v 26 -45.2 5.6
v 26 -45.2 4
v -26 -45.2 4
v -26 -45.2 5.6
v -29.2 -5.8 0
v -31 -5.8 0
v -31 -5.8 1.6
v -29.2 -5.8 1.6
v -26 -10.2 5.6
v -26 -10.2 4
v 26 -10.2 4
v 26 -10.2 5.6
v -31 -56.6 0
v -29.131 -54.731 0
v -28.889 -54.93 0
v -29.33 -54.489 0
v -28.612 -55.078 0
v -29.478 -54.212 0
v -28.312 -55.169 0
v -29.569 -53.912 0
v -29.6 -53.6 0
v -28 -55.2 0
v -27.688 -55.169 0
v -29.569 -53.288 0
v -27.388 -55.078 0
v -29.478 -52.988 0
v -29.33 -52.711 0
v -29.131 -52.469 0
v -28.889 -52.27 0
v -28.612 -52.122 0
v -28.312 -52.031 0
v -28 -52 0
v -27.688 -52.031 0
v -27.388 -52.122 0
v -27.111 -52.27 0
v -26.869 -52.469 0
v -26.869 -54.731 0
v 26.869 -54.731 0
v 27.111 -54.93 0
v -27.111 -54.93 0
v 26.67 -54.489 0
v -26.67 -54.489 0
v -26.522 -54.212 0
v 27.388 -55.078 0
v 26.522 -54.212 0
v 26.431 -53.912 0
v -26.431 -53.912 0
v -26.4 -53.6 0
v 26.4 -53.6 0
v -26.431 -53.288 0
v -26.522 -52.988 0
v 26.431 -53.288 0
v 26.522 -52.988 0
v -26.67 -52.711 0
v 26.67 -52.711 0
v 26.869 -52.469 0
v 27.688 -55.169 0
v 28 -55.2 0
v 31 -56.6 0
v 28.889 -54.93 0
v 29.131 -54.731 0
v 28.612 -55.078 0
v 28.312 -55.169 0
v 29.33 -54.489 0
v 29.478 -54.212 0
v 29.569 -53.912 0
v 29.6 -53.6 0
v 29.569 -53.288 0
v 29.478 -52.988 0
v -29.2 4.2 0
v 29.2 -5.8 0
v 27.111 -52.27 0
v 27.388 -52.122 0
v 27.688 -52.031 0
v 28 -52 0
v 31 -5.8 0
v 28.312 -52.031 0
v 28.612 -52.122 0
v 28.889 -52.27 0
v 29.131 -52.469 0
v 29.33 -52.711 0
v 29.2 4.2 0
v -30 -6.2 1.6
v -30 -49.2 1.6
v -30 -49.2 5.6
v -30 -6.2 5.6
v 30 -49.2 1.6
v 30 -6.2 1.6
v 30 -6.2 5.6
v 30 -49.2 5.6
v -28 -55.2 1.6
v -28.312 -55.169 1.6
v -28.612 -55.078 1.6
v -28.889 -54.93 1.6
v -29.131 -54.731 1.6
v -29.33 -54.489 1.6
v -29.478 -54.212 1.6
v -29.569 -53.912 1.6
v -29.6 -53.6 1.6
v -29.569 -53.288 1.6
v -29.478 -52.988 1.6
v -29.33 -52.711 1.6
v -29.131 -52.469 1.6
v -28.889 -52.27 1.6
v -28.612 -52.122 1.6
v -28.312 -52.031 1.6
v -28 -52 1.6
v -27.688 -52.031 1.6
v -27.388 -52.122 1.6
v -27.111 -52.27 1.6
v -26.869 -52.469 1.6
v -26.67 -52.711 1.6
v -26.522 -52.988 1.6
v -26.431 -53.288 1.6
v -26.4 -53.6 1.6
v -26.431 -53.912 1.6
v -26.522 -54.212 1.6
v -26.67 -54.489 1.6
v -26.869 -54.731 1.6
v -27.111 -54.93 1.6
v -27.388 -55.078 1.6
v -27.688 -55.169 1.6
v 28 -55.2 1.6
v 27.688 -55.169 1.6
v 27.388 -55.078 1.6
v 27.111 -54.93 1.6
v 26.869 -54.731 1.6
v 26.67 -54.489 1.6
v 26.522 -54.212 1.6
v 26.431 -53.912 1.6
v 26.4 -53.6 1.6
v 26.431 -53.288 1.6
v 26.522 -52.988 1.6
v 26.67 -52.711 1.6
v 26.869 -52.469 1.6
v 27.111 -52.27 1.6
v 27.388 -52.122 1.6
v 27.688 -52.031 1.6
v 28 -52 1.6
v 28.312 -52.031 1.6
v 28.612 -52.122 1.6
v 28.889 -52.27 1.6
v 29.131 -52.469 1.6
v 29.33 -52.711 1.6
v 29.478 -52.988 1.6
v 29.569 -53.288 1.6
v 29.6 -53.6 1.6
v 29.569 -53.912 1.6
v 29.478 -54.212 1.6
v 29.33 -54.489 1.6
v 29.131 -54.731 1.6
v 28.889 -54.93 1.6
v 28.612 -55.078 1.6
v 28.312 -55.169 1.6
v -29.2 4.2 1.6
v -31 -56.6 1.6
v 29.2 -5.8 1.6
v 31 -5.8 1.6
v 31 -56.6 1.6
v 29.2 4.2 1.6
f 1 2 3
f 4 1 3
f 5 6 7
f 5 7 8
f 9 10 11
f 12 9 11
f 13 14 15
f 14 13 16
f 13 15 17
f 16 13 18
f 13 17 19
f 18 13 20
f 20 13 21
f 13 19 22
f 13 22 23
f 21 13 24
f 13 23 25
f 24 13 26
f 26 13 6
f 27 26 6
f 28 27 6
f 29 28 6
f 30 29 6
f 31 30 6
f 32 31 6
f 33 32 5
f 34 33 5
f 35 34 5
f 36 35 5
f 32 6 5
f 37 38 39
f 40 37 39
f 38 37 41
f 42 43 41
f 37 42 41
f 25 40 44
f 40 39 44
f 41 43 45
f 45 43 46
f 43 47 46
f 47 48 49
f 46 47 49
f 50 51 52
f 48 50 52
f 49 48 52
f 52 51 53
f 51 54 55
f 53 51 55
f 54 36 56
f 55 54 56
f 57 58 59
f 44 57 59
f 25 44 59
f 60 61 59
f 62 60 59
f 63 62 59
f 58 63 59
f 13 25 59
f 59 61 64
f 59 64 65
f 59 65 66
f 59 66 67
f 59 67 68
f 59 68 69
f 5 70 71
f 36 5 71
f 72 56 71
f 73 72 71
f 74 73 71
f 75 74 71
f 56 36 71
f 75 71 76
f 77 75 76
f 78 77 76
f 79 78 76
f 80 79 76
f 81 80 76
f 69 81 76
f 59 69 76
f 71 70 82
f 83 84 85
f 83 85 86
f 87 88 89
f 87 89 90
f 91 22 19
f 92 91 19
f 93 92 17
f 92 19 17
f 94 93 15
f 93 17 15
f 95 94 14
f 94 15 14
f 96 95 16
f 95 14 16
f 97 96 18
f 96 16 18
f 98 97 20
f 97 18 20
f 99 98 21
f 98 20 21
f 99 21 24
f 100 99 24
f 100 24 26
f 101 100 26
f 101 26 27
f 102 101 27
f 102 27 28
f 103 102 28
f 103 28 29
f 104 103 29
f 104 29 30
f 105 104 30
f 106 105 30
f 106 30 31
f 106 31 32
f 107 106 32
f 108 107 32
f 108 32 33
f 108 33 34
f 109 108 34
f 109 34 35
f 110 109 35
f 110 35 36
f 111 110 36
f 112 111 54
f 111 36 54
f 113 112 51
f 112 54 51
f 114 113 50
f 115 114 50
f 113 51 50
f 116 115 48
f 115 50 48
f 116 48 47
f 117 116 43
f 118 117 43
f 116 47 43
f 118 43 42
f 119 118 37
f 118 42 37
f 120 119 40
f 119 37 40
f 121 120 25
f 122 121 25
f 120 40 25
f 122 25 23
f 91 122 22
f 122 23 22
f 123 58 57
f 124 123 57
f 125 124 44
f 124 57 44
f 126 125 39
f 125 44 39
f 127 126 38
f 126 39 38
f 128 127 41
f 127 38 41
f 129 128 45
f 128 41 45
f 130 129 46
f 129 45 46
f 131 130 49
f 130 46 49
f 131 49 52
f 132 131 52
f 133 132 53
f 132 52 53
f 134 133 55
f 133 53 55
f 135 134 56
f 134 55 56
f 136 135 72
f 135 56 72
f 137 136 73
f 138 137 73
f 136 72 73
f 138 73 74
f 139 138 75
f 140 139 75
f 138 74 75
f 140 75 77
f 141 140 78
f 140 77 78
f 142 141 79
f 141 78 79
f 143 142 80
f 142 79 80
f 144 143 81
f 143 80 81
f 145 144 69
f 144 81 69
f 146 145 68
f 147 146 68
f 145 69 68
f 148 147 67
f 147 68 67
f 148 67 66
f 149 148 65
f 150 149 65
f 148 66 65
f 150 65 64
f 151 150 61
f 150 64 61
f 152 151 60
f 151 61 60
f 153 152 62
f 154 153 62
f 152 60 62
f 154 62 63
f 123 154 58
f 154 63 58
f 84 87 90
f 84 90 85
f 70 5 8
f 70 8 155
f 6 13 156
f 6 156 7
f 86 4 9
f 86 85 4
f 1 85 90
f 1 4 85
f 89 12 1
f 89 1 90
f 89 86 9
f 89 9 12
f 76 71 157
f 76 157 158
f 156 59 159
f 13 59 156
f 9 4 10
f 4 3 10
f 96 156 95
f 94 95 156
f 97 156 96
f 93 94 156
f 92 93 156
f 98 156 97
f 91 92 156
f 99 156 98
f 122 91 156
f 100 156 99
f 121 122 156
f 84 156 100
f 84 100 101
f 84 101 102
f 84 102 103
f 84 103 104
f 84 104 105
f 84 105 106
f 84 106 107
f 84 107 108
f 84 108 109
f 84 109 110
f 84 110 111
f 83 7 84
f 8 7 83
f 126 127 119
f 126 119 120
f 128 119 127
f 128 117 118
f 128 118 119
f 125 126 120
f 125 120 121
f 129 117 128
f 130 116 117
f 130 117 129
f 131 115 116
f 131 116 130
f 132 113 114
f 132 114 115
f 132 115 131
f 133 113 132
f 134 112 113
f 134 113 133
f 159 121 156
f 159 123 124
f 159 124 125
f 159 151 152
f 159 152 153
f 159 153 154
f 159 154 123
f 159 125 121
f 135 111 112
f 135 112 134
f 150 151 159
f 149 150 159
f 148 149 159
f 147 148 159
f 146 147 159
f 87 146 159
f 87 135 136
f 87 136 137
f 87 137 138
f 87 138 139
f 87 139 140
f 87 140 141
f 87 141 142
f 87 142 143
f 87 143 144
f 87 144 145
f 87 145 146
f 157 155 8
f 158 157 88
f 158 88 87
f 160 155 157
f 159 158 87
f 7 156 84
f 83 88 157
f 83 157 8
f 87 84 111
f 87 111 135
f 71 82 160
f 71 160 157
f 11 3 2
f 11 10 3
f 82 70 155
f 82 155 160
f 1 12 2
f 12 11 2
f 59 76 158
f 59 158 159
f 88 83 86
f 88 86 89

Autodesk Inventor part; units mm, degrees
ref_plane "YZ Plane" through (0, 0, 0) normal (1, 0, 0) x (0, 1, 0)
ref_plane "XZ Plane" through (0, 0, 0) normal (0, 1, 0) x (-1, 0, 0)
ref_plane "XY Plane" through (0, 0, 0) normal (0, 0, 1) x (1, 0, 0)
sketch "Skizze1" plane through (0, 0, 0) normal (0, 0, 1) x (1, 0, 0)
  line L0 (-29.2, 4.2) -> (29.2, 4.2)
  line L1 (29.2, 4.2) -> (29.2, -5.8)
  line L2 (29.2, -5.8) -> (31, -5.8)
  line L3 (31, -5.8) -> (31, -56.6)
  line L4 (31, -56.6) -> (-31, -56.6)
  line L5 (-31, -56.6) -> (-31, -5.8)
  line L6 (-31, -5.8) -> (-29.2, -5.8)
  line L7 (-29.2, -5.8) -> (-29.2, 4.2)
  line L8 (-43.4, 0) -> (43.4, 0) projected
  line L9 (0, 16.36) -> (0, -68.76) projected
  point P0 (0, 0)
  dimension "d0" = 4.2
  dimension "d1" = 5.8
  dimension "d2" = 56.6
  dimension "d3" = 62
  dimension "d4" = 58.4
extrude "Extrusion1" add sketch "Skizze1" along normal blind 1.6
sketch "Skizze2" plane through (0, 0, 1.6) normal (0, 0, 1) x (1, 0, 0)
  line L0 (-28, -53.6) -> (28, -53.6) construction
  line L1 (0, 16.36) -> (0, -68.76) construction
  line L2 (-43.4, 0) -> (43.4, 0) construction
  point P0 (0, 0)
  dimension "d7" = 53.6
  dimension "d8" = 56
hole "Bohrung1" at (-28, -53.6, 1.6) at (28, -53.6, 1.6) direction (0, 0, -1) diameter 3.2 end through all
sketch "Skizze3" plane through (0, 0, 1.6) normal (0, 0, 1) x (1, 0, 0)
  line L0 (0, 16.36) -> (0, -68.76) projected
  line L1 (-43.4, 0) -> (43.4, 0) projected
  line L2 (-30, -6.2) -> (30, -6.2)
  line L3 (30, -6.2) -> (30, -49.2)
  line L4 (30, -49.2) -> (-30, -49.2)
  line L5 (-30, -49.2) -> (-30, -6.2)
  point P0 (0, 0)
  dimension "d16" = 60
  dimension "d17" = 43
  dimension "d18" = 6.2
extrude "Extrusion2" add sketch "Skizze3" along normal blind 4
shell "Wandung1" thickness 4 removed faces 1 at (10, -20.5333, 5.6)
properties part number "LT24" material "Phenolharz"
